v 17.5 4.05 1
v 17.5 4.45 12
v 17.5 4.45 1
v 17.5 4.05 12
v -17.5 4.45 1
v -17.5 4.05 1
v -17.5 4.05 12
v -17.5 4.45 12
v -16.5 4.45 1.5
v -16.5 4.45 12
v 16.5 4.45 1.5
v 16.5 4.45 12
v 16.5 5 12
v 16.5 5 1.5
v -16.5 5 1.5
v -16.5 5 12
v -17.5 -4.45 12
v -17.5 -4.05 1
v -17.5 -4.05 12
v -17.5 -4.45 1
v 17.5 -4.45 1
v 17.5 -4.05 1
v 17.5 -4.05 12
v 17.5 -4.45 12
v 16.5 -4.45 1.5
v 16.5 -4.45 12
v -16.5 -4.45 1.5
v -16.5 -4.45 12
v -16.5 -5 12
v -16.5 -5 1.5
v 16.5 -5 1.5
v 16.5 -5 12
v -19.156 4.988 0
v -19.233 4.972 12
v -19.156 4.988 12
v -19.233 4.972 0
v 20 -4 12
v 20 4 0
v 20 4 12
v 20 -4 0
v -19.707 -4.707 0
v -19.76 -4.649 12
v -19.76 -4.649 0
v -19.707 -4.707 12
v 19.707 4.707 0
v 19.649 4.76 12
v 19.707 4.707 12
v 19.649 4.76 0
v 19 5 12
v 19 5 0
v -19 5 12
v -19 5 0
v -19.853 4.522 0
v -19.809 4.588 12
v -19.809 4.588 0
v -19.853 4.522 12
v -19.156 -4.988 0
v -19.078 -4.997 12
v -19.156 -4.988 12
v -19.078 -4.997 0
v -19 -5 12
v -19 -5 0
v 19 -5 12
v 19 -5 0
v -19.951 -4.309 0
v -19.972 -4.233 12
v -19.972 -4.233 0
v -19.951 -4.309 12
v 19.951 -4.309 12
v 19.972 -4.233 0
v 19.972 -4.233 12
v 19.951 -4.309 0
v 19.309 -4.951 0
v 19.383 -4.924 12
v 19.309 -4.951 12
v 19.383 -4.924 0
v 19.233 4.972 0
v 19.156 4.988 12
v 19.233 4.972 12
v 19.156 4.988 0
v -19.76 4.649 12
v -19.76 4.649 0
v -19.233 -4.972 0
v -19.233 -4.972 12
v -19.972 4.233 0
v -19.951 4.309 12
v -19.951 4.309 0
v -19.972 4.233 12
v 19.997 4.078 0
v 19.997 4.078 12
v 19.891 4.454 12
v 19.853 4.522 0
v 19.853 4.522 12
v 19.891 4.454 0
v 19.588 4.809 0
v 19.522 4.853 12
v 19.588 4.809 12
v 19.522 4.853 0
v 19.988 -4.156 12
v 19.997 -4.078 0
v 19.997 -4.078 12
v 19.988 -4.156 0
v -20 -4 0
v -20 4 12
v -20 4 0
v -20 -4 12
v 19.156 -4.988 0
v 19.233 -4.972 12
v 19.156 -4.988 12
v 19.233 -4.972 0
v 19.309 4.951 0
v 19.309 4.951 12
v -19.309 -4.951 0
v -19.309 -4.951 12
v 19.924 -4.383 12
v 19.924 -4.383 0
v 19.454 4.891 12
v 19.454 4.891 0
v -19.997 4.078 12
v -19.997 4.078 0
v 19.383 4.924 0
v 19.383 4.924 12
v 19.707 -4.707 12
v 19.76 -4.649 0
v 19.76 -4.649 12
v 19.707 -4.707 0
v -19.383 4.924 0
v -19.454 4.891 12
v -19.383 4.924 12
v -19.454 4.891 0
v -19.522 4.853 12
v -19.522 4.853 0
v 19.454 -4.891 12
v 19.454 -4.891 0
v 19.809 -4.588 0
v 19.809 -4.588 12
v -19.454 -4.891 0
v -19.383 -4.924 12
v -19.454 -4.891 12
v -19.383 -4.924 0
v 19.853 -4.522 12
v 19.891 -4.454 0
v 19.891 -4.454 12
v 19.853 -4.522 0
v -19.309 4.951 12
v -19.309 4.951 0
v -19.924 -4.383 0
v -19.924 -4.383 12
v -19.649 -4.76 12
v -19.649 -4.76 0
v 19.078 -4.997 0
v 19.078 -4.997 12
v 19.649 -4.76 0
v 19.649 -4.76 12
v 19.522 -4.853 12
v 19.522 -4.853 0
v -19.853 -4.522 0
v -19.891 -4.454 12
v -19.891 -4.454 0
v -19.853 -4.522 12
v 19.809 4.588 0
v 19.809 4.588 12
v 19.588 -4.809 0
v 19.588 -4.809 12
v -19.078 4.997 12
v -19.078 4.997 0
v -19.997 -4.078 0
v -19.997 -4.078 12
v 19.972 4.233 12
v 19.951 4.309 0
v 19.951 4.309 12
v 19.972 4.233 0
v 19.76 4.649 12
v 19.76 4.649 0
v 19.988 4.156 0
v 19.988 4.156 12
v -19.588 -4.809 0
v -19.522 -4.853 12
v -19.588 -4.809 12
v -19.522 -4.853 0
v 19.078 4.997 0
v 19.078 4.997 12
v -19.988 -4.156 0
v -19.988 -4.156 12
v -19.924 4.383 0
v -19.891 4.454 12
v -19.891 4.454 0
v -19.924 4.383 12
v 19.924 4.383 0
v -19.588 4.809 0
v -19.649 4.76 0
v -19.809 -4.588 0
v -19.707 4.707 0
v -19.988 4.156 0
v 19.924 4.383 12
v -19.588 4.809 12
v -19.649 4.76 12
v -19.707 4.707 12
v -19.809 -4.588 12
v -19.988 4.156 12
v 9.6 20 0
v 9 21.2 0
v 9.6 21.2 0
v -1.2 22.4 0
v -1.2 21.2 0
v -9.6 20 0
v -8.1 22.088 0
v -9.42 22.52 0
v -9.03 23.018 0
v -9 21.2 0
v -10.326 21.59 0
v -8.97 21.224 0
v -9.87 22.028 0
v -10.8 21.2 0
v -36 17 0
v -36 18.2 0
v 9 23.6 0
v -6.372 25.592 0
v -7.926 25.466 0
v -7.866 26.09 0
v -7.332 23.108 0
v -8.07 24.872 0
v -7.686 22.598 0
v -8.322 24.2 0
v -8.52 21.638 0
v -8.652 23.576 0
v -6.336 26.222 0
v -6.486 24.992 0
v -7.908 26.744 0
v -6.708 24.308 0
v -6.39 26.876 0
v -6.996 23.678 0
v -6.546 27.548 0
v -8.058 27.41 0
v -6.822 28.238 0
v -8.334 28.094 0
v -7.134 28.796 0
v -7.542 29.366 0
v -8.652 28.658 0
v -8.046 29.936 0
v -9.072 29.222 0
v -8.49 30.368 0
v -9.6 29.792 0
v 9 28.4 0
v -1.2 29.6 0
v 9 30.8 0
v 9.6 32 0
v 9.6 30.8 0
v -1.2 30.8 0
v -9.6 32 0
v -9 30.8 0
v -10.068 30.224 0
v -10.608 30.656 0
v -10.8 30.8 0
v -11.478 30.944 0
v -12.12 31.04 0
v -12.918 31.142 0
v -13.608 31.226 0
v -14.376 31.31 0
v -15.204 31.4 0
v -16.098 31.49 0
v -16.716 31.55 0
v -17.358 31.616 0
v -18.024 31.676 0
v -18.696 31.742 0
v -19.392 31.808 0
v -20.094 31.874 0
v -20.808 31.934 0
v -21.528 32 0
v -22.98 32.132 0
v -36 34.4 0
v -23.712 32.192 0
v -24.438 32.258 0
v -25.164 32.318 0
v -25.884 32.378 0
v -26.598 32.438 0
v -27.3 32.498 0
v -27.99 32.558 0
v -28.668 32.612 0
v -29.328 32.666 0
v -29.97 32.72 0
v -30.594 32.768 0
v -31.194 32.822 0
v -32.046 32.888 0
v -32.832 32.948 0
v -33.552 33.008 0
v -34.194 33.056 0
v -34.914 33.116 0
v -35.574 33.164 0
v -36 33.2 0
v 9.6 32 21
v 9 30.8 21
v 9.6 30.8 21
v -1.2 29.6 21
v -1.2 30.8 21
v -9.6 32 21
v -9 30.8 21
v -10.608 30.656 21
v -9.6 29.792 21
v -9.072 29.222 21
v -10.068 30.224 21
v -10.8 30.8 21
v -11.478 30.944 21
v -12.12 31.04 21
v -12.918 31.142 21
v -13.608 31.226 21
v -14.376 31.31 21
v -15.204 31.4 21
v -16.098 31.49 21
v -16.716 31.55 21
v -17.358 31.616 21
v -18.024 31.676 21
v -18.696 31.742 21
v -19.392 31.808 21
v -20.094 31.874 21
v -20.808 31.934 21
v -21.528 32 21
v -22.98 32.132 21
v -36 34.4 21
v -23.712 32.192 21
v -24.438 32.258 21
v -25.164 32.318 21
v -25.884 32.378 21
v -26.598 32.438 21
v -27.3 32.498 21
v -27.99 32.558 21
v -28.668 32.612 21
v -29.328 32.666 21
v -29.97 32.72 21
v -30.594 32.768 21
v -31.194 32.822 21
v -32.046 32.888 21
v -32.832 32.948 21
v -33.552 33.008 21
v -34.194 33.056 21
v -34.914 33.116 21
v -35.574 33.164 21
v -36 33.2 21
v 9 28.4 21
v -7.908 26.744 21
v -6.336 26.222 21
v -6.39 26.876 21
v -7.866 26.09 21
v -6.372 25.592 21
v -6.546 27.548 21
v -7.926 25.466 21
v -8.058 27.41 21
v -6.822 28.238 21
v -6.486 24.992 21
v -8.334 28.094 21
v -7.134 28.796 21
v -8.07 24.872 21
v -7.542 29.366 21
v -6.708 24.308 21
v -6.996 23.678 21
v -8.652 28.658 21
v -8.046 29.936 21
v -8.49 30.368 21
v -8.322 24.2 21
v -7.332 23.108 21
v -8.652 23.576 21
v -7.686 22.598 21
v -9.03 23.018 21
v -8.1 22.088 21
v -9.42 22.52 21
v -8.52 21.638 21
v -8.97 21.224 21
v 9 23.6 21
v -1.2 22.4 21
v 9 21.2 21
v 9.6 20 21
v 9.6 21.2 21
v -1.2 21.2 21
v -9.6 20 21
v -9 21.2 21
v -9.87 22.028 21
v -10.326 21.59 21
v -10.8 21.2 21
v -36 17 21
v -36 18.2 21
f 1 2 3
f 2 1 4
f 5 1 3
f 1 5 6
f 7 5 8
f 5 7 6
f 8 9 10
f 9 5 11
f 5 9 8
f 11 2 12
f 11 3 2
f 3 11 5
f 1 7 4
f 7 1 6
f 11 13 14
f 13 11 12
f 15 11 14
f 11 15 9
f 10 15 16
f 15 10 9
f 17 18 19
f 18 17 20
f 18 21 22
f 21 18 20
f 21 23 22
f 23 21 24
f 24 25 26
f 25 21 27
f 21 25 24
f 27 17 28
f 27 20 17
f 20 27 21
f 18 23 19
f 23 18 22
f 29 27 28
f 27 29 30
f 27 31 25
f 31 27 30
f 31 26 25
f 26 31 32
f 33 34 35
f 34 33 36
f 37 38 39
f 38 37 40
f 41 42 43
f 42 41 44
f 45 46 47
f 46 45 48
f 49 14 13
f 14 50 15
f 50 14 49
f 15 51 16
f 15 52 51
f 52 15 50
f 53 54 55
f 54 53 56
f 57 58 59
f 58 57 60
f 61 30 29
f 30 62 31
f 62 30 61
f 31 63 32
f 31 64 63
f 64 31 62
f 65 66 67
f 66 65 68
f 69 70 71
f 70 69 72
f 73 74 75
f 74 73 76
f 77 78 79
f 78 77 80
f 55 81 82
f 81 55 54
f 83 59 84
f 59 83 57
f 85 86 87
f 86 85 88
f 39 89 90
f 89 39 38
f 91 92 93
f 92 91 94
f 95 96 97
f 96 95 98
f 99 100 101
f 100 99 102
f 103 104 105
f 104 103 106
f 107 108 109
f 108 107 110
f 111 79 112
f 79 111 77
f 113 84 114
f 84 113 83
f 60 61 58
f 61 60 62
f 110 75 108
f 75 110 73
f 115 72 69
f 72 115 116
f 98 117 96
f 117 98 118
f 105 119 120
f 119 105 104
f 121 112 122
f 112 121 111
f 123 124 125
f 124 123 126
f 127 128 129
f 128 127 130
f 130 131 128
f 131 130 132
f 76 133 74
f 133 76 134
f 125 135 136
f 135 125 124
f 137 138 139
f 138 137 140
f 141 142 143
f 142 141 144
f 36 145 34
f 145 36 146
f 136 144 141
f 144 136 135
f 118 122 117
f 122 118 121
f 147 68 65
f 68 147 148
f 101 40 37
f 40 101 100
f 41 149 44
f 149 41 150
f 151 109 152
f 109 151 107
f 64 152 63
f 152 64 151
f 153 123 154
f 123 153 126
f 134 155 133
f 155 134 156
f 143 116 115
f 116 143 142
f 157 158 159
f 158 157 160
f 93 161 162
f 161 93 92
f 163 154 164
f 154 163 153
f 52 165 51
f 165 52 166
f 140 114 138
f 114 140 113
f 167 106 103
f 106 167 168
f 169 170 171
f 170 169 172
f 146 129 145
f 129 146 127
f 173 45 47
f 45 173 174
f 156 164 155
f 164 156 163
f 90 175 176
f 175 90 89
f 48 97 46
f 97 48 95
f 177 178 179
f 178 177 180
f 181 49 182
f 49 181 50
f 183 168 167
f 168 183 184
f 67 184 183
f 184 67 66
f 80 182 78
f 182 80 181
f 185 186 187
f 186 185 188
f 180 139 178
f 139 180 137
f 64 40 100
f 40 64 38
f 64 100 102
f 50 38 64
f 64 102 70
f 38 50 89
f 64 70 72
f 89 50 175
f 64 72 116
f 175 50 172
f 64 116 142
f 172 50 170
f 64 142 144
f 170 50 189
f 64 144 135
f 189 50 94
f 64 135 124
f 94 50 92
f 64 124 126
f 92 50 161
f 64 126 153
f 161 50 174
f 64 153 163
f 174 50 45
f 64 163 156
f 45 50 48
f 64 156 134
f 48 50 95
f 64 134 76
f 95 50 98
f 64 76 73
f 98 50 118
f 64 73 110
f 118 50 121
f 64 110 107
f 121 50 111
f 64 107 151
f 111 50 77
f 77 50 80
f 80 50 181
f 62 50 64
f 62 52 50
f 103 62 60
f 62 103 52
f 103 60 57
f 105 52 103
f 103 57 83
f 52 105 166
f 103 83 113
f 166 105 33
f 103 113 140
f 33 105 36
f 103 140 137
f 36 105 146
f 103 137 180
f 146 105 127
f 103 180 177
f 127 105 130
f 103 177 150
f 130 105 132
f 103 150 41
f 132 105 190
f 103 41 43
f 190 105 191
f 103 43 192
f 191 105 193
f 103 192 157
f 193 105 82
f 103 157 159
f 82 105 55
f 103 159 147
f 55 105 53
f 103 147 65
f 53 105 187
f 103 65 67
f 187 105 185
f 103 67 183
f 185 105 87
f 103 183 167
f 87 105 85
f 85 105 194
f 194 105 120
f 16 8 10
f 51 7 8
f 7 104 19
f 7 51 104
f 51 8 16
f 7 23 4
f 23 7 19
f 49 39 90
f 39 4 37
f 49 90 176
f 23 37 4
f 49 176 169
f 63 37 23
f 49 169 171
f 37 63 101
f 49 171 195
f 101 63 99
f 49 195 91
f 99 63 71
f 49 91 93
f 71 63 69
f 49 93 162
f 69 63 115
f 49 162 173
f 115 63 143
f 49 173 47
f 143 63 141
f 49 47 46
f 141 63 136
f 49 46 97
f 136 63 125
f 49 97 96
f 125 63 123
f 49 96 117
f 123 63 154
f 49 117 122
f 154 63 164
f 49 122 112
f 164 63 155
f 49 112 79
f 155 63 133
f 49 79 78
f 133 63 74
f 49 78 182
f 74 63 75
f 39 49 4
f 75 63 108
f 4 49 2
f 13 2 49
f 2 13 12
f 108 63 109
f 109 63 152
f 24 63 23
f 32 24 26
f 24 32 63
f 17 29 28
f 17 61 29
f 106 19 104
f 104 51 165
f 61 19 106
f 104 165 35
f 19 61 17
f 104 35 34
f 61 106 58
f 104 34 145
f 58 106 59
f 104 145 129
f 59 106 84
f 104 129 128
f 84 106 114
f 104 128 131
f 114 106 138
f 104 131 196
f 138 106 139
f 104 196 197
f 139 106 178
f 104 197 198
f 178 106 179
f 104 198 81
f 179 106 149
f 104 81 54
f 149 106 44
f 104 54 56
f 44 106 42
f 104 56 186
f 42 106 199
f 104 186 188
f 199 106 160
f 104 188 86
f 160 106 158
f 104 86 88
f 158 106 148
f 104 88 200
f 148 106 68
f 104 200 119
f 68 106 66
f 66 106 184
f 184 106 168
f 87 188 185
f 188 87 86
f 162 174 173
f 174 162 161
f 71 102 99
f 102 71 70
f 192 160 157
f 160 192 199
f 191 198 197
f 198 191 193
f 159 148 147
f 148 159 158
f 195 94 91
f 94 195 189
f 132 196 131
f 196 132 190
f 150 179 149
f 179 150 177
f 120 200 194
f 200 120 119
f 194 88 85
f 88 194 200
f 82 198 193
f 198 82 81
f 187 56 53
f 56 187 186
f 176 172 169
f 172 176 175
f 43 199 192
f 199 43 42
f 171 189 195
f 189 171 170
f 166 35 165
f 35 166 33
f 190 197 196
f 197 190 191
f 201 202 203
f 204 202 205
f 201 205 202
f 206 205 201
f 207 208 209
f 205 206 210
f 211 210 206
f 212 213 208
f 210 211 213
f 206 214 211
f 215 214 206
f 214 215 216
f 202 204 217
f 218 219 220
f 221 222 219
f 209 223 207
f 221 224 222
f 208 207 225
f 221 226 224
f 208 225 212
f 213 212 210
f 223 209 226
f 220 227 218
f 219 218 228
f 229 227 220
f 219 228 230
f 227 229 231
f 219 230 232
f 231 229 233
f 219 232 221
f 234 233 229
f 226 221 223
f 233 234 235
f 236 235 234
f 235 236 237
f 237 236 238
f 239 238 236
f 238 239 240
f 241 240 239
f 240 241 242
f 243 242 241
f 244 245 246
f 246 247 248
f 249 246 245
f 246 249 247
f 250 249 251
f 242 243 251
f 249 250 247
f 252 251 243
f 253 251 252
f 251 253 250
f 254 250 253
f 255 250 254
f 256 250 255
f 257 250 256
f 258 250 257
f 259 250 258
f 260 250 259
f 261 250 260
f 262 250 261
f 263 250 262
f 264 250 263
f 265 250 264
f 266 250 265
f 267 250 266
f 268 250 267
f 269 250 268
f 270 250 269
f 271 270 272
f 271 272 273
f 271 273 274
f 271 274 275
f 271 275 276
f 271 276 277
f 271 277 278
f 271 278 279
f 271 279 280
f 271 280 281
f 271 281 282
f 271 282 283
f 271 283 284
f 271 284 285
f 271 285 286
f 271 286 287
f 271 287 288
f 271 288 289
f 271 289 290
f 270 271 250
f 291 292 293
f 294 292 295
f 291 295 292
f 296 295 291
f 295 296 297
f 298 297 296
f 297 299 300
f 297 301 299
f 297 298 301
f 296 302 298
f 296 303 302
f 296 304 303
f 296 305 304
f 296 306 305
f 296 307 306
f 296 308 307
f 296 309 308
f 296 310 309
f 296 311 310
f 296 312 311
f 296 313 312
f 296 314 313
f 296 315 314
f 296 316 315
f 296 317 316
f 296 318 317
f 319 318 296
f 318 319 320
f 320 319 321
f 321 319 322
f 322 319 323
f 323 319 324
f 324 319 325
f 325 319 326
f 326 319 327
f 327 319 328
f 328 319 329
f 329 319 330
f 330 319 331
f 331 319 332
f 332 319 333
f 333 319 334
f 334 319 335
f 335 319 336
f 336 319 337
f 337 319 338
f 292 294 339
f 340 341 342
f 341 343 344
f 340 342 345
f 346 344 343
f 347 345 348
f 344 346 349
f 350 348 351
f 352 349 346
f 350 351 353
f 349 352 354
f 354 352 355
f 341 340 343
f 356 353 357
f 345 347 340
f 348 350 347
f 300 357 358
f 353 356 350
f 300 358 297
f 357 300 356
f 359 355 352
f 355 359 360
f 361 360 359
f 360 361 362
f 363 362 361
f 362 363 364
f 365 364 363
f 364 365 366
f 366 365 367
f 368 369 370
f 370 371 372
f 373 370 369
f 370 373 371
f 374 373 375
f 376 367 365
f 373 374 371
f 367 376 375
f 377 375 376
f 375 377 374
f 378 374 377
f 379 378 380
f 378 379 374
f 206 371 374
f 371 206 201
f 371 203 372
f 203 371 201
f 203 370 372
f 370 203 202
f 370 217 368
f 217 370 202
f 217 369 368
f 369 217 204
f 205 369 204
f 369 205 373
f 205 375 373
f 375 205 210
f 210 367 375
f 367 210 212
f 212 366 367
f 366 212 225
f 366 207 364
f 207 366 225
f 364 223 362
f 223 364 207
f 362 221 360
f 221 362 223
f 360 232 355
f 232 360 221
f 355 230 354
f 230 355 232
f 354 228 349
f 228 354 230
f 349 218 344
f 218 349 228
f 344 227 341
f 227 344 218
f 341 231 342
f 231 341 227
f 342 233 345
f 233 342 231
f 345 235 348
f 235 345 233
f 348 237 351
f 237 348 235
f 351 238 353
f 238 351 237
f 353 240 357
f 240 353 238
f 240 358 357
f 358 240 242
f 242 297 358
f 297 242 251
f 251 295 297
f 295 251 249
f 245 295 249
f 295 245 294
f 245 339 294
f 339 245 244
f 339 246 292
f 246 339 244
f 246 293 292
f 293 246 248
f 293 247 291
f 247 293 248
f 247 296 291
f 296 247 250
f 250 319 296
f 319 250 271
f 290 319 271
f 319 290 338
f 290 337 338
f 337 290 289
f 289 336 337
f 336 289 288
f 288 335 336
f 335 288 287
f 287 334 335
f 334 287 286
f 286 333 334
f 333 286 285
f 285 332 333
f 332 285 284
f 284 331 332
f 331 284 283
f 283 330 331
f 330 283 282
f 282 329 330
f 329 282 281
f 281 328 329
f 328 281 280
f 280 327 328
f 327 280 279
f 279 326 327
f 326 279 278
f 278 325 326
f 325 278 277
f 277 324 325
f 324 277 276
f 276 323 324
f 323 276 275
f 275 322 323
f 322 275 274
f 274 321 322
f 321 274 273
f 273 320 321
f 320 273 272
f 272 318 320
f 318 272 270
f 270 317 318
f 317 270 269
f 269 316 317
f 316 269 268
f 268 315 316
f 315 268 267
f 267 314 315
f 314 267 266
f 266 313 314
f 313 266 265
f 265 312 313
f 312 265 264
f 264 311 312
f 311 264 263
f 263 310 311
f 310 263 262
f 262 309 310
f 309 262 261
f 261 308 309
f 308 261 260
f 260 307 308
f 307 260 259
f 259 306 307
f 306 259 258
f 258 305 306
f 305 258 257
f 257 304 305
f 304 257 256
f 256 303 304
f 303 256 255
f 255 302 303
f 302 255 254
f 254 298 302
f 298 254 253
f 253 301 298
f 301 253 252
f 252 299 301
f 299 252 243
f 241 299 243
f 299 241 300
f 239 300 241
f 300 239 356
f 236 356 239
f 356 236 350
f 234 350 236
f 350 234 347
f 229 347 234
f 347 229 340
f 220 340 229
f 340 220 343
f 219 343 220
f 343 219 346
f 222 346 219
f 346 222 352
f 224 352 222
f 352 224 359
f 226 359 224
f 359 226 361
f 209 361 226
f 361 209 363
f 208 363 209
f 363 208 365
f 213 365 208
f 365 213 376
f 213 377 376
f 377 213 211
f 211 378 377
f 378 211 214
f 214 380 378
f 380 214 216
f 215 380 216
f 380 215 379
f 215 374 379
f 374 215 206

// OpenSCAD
use <threads.scad>

container_bottom_radius = 89 / 2;
container_top_radius = 112 / 2;
container_height = 135.3;

pump_mount_depth = 10;
pump_mount_height = container_height + 15;

rear_wall_depth = 5;
rear_wall_height = 15;

distance_between_containers = 30;

$fn = 80;

// base();
// back();
electrode_holder();
// cbracket();
// fancy_clip();

module base() {
    border_width = 10;
    h = 3;
    dr = container_bottom_radius;
    bw = border_width;
    
    w = dr * 2 + bw * 2 + distance_between_containers;
    d = dr + bw * 2;
    r = 20;
    
    dist = dr + distance_between_containers;
    
    pw = w - pump_mount_depth / 2 - 10;
    rw = d - 5;
    
    y = -12; // nudge forward
    
    // translate([dist, 0]) container();
    // translate([-dist, 0]) container();
    
    difference() {
        union() {
            hull() standoffs(h, w, d, r);
            translate([dist, y]) cylinder(40, r=dr+4);
            translate([-dist, y]) cylinder(40, r=dr+4);
            translate([pw, y]) pump_mount();
            translate([-pw, y]) pump_mount();
            translate([0, rw]) rear_wall();
        }
        translate([dist, y]) solenoid_funnel();
        translate([-dist, y]) solenoid_funnel();
    }
}

module back(){
    w = 85;
    h = 200;
    d = 2;
    r = 2.5;
    
    box_width = 266.7 / 2;
    box_height = 40;
    
    shelf_width = 100;
    shelf_depth = 58;
    
    rotate([-90, 0]) {
        difference() {
            union() {
                translate([0, 0, 14]) hull() scale(0.99) standoffs(h,w,d,r);
                translate([0, 0, h - box_height/2]) hull() scale(0.99) standoffs(box_height,box_width,d,r);
                mount_points(0.99);
                translate([0, 62/2, h + box_height/2 - 3]) cube([w, 62, 5], center=true);
                translate([-6/2 + 30, 0, h + box_height/2 - 3]) rotate([0, 90]) linear_extrude(6) scale(3) polygon([[0,0],[8,0],[0,8]]);
                translate([-6/2 - 30, 0, h + box_height/2 - 3]) rotate([0, 90]) linear_extrude(6) scale(3) polygon([[0,0],[8,0],[0,8]]);

            }
            translate([0, 2, 105]) rotate([90, 270, 180]) linear_extrude(1.2) text("synthwave", size=18, halign="center", valign="center");
        }
    }
}

module electrode_grip() {
    h = 20;
    r = 1;
    
    hull () {
        translate([2, 0]) cylinder(h, r=r);
        translate([-2, 0]) cylinder(h, r=r);
    }
    hull () {
        translate([2, 20]) cylinder(h, r=r);
        translate([-2, 20]) cylinder(h, r=r);
    }
}
    
module electrode_holder() {
    w = 20;
    h = 12;
    d = 5;
    r = 1;
    
    difference() {
        hull() standoffs(h, w, d, r);
        translate([0, d/2 + 1.75]) nickel_strip_cutout();
        translate([0, -d/2 - 1.75]) rotate([0, 0, 180]) nickel_strip_cutout();
    }
 
    translate([0, w]) scale(0.6) clip();
}

module nickel_strip_cutout() {
    d = 0.4;
    h = 12;
    w = 35;
    
    translate([0, 0, h/2 + 1]) {
        cube([w, d, h], center=true); // strip
        translate([0, d+1 / 2]) cube([w-2, d+1, h-1], center=true); // window 
        // translate([2, 0, -h/2 + 4]) cylinder(h, r=1.5); // make room for wire
        // translate([2, 5.2, -1.5]) sphere(r=7); // make room for solder blob
    }
}

module cbracket() {
    // quarter circle
    r = 70;
    intersection() {
        difference() {
            linear_extrude(10) circle(r);
            linear_extrude(10) circle(r - 3);
        }
        cube(r);
    }
    
    
}

module clip() {
    y1 = 6;
    y2 = 14;
    linear_extrude(35) polygon([[-15,2],[-2,2],[-2,4],[15,y1],[15,2],[16,2],[16,0],[-16,0],[-60,-5],[-60,-3],[-18,2/*1:0,0,0,0*/] ,[-17.21,2.65] ,[-16.45,3.38] ,[-15.7,4.2] ,[-15.05,5.03] ,[-14.42,5.96] ,[-13.87,7] ,[-13.45,8.12] ,[-13.21,9.11] ,[-13.11,10.15] ,[-13.18,11.24] ,[-13.43,12.35] ,[-13.89,13.49] ,[-14.42,14.43] ,[-15.12,15.37] ,[-16,16.32] ,[-16.78,17.04] ,[-17.68,17.76],[-18,18/*1:11,-8,-3,1*/] ,[-19.13,18.24] ,[-20.2,18.4] ,[-21.53,18.57] ,[-22.68,18.71] ,[-23.96,18.85] ,[-25.34,19] ,[-26.83,19.15] ,[-27.86,19.25] ,[-28.93,19.36] ,[-30.04,19.46] ,[-31.16,19.57] ,[-32.32,19.68] ,[-33.49,19.79] ,[-34.68,19.89] ,[-35.88,20] ,[-37.09,20.11] ,[-38.3,20.22] ,[-39.52,20.32] ,[-40.73,20.43] ,[-41.94,20.53] ,[-43.14,20.63] ,[-44.33,20.73] ,[-45.5,20.83] ,[-46.65,20.93] ,[-47.78,21.02] ,[-48.88,21.11] ,[-49.95,21.2] ,[-50.99,21.28] ,[-51.99,21.37] ,[-53.41,21.48] ,[-54.72,21.58] ,[-55.92,21.68] ,[-56.99,21.76] ,[-58.19,21.86] ,[-59.29,21.94],[-60,22],[-60,24],[-16,20],[16,20],[16,18],[15,18],[15,y2],[-2,16],[-2,18/*1:0,0,0,0*/] ,[-3.05,18] ,[-4.15,18] ,[-5.18,18] ,[-6.34,18] ,[-7.39,18] ,[-8.47,18] ,[-9.56,18] ,[-10.62,18] ,[-11.64,18] ,[-12.73,18] ,[-13.81,18] ,[-14.87,18],[-15,18/*1:2,0,10,-8*/] ,[-14.15,17.28] ,[-13.41,16.56] ,[-12.57,15.61] ,[-11.89,14.66] ,[-11.37,13.73] ,[-10.91,12.58] ,[-10.65,11.46] ,[-10.56,10.37] ,[-10.62,9.32] ,[-10.81,8.32] ,[-11.18,7.18] ,[-11.66,6.13] ,[-12.22,5.18] ,[-12.81,4.33] ,[-13.5,3.48] ,[-14.2,2.73] ,[-14.95,2.04]]);
}

module fancy_clip() {
    linear_extrude(35) polygon([[-15,2/*1:5,4,3,0*/] ,[-13.91,2] ,[-12.8,2] ,[-11.7,2] ,[-10.7,2] ,[-9.66,2] ,[-8.6,2] ,[-7.55,2] ,[-6.53,2] ,[-5.4,2] ,[-4.38,2] ,[-3.27,2] ,[-2.23,2],[-2,2],[-2,4],[15,4],[15,2],[16,2],[16,0],[-16,0],[-70,-13/*1:0,0,0,0*/] ,[-70,-12],[-70,-11/*1:0,0,0,0*/] ,[-68.81,-10.7] ,[-67.59,-10.4] ,[-66.43,-10.11] ,[-65.08,-9.77] ,[-64.08,-9.52] ,[-63.01,-9.25] ,[-61.87,-8.97] ,[-60.67,-8.67] ,[-59.42,-8.35] ,[-58.11,-8.03] ,[-56.75,-7.69] ,[-55.35,-7.34] ,[-53.91,-6.98] ,[-52.44,-6.61] ,[-50.94,-6.24] ,[-49.42,-5.86] ,[-47.89,-5.47] ,[-46.34,-5.08] ,[-44.78,-4.69] ,[-43.22,-4.31] ,[-41.66,-3.92] ,[-40.11,-3.53] ,[-38.58,-3.14] ,[-37.06,-2.76] ,[-35.56,-2.39] ,[-34.09,-2.02] ,[-32.65,-1.66] ,[-31.25,-1.31] ,[-29.89,-0.97] ,[-28.58,-0.65] ,[-27.33,-0.33] ,[-26.12,-0.03] ,[-24.99,0.25] ,[-23.92,0.52] ,[-22.92,0.77] ,[-21.57,1.11] ,[-20.41,1.4] ,[-19.19,1.7] ,[-18.14,1.97],[-18,2/*1:0,0,0,0*/] ,[-17.21,2.65] ,[-16.45,3.38] ,[-15.7,4.2] ,[-15.05,5.03] ,[-14.42,5.96] ,[-13.87,7] ,[-13.45,8.12] ,[-13.21,9.11] ,[-13.11,10.15] ,[-13.18,11.24] ,[-13.43,12.35] ,[-13.89,13.49] ,[-14.42,14.43] ,[-15.12,15.37] ,[-16,16.32] ,[-16.78,17.04] ,[-17.68,17.76],[-18,18/*1:11,-8,-3,1*/] ,[-19.03,18.3] ,[-20.21,18.64] ,[-21.34,18.94] ,[-22.65,19.3] ,[-23.62,19.56] ,[-24.66,19.84] ,[-25.77,20.14] ,[-26.94,20.45] ,[-28.17,20.77] ,[-29.45,21.11] ,[-30.77,21.47] ,[-32.14,21.83] ,[-33.55,22.2] ,[-34.99,22.58] ,[-36.46,22.97] ,[-37.95,23.36] ,[-39.47,23.76] ,[-40.99,24.16] ,[-42.53,24.56] ,[-44.08,24.97] ,[-45.62,25.38] ,[-47.17,25.78] ,[-48.7,26.18] ,[-50.22,26.58] ,[-51.73,26.97] ,[-53.21,27.36] ,[-54.66,27.74] ,[-56.09,28.11] ,[-57.47,28.47] ,[-58.82,28.83] ,[-60.12,29.17] ,[-61.37,29.49] ,[-62.56,29.8] ,[-63.7,30.1] ,[-64.77,30.38] ,[-65.78,30.64] ,[-67.14,31] ,[-68.33,31.3] ,[-69.31,31.56] ,[-70.3,31.82],[-71,32],[-71,34],[-16,20],[16,20],[16,18],[15,18],[15,16/*1:0,0,0,0*/] ,[13.97,16] ,[12.89,16] ,[11.75,16] ,[10.67,16] ,[9.5,16] ,[8.27,16] ,[7.26,16] ,[6.25,16] ,[5.23,16] ,[3.98,16] ,[2.79,16] ,[1.67,16] ,[0.66,16] ,[-0.39,16] ,[-1.43,16],[-2,16/*1:0,0,0,0*/] ,[-2,17],[-2,18/*1:0,0,0,0*/] ,[-3.05,18] ,[-4.15,18] ,[-5.18,18] ,[-6.34,18] ,[-7.39,18] ,[-8.47,18] ,[-9.56,18] ,[-10.62,18] ,[-11.64,18] ,[-12.73,18] ,[-13.81,18] ,[-14.87,18],[-15,18/*1:2,0,5,-5*/] ,[-14.29,17.28] ,[-13.56,16.49] ,[-12.84,15.67] ,[-12.19,14.86] ,[-11.61,14.02] ,[-11.12,13.13] ,[-10.94,12.13],[-11,12],[-2,12],[-2,15],[15,15],[15,5],[-2,5],[-2,8],[-11,8/*1:0,0,0,0*/] ,[-10.98,6.99] ,[-11.32,6.05] ,[-11.87,5.14] ,[-12.5,4.35] ,[-13.23,3.56] ,[-14.04,2.81] ,[-14.85,2.12]]);

}

module container() {
    r1 = container_bottom_radius;
    r2 = container_top_radius;
    h = container_height;
    cylinder(h, r1, r2);
}

module rear_wall() {
    h = rear_wall_height;
    d = rear_wall_depth;
    w = 80;
    r = 3;
    
    difference() {
        hull() standoffs(h, w, d, r);
        mount_points();
    }
}

module mount_points(s=1) {
    translate([17, 0, 5]) scale(s) mount_point();
    translate([50, 0, 5]) scale(s) mount_point();
    translate([-17, 0, 5]) scale(s) mount_point();
    translate([-50, 0, 5]) scale(s) mount_point();
}

module mount_point() {
    hull() standoffs(10, 10, 2, 2.5);
}

module pump_mount() {
    h = pump_mount_height;
    w = pump_mount_depth;
    d = 25;
    r = 3;
    
    hull() standoffs(h, w, d, r);
}

module solenoid_funnel() {
    h = 10;
    r1 = 15;
    r2 = container_bottom_radius;
     
    translate([0, 0, h]) cylinder(h, r1, r2 - 15);
    translate([0, 0, h*2]) container();
    
    translate([0, 0, h]) rotate([180, 0]) ScrewThread(26.670, h, pitch=1.814);
    // english_thread(diameter=1.05, threads_per_inch=14, length=3/4, taper=1/16);
}

module standoffs(h, w, d, r) {
    translate([w-r, d-r]) cylinder(h, r, r);
    translate([w-r, -d+r]) cylinder(h, r, r);
    translate([-w+r, d-r]) cylinder(h, r, r);
    translate([-w+r, -d+r]) cylinder(h, r, r);
}
